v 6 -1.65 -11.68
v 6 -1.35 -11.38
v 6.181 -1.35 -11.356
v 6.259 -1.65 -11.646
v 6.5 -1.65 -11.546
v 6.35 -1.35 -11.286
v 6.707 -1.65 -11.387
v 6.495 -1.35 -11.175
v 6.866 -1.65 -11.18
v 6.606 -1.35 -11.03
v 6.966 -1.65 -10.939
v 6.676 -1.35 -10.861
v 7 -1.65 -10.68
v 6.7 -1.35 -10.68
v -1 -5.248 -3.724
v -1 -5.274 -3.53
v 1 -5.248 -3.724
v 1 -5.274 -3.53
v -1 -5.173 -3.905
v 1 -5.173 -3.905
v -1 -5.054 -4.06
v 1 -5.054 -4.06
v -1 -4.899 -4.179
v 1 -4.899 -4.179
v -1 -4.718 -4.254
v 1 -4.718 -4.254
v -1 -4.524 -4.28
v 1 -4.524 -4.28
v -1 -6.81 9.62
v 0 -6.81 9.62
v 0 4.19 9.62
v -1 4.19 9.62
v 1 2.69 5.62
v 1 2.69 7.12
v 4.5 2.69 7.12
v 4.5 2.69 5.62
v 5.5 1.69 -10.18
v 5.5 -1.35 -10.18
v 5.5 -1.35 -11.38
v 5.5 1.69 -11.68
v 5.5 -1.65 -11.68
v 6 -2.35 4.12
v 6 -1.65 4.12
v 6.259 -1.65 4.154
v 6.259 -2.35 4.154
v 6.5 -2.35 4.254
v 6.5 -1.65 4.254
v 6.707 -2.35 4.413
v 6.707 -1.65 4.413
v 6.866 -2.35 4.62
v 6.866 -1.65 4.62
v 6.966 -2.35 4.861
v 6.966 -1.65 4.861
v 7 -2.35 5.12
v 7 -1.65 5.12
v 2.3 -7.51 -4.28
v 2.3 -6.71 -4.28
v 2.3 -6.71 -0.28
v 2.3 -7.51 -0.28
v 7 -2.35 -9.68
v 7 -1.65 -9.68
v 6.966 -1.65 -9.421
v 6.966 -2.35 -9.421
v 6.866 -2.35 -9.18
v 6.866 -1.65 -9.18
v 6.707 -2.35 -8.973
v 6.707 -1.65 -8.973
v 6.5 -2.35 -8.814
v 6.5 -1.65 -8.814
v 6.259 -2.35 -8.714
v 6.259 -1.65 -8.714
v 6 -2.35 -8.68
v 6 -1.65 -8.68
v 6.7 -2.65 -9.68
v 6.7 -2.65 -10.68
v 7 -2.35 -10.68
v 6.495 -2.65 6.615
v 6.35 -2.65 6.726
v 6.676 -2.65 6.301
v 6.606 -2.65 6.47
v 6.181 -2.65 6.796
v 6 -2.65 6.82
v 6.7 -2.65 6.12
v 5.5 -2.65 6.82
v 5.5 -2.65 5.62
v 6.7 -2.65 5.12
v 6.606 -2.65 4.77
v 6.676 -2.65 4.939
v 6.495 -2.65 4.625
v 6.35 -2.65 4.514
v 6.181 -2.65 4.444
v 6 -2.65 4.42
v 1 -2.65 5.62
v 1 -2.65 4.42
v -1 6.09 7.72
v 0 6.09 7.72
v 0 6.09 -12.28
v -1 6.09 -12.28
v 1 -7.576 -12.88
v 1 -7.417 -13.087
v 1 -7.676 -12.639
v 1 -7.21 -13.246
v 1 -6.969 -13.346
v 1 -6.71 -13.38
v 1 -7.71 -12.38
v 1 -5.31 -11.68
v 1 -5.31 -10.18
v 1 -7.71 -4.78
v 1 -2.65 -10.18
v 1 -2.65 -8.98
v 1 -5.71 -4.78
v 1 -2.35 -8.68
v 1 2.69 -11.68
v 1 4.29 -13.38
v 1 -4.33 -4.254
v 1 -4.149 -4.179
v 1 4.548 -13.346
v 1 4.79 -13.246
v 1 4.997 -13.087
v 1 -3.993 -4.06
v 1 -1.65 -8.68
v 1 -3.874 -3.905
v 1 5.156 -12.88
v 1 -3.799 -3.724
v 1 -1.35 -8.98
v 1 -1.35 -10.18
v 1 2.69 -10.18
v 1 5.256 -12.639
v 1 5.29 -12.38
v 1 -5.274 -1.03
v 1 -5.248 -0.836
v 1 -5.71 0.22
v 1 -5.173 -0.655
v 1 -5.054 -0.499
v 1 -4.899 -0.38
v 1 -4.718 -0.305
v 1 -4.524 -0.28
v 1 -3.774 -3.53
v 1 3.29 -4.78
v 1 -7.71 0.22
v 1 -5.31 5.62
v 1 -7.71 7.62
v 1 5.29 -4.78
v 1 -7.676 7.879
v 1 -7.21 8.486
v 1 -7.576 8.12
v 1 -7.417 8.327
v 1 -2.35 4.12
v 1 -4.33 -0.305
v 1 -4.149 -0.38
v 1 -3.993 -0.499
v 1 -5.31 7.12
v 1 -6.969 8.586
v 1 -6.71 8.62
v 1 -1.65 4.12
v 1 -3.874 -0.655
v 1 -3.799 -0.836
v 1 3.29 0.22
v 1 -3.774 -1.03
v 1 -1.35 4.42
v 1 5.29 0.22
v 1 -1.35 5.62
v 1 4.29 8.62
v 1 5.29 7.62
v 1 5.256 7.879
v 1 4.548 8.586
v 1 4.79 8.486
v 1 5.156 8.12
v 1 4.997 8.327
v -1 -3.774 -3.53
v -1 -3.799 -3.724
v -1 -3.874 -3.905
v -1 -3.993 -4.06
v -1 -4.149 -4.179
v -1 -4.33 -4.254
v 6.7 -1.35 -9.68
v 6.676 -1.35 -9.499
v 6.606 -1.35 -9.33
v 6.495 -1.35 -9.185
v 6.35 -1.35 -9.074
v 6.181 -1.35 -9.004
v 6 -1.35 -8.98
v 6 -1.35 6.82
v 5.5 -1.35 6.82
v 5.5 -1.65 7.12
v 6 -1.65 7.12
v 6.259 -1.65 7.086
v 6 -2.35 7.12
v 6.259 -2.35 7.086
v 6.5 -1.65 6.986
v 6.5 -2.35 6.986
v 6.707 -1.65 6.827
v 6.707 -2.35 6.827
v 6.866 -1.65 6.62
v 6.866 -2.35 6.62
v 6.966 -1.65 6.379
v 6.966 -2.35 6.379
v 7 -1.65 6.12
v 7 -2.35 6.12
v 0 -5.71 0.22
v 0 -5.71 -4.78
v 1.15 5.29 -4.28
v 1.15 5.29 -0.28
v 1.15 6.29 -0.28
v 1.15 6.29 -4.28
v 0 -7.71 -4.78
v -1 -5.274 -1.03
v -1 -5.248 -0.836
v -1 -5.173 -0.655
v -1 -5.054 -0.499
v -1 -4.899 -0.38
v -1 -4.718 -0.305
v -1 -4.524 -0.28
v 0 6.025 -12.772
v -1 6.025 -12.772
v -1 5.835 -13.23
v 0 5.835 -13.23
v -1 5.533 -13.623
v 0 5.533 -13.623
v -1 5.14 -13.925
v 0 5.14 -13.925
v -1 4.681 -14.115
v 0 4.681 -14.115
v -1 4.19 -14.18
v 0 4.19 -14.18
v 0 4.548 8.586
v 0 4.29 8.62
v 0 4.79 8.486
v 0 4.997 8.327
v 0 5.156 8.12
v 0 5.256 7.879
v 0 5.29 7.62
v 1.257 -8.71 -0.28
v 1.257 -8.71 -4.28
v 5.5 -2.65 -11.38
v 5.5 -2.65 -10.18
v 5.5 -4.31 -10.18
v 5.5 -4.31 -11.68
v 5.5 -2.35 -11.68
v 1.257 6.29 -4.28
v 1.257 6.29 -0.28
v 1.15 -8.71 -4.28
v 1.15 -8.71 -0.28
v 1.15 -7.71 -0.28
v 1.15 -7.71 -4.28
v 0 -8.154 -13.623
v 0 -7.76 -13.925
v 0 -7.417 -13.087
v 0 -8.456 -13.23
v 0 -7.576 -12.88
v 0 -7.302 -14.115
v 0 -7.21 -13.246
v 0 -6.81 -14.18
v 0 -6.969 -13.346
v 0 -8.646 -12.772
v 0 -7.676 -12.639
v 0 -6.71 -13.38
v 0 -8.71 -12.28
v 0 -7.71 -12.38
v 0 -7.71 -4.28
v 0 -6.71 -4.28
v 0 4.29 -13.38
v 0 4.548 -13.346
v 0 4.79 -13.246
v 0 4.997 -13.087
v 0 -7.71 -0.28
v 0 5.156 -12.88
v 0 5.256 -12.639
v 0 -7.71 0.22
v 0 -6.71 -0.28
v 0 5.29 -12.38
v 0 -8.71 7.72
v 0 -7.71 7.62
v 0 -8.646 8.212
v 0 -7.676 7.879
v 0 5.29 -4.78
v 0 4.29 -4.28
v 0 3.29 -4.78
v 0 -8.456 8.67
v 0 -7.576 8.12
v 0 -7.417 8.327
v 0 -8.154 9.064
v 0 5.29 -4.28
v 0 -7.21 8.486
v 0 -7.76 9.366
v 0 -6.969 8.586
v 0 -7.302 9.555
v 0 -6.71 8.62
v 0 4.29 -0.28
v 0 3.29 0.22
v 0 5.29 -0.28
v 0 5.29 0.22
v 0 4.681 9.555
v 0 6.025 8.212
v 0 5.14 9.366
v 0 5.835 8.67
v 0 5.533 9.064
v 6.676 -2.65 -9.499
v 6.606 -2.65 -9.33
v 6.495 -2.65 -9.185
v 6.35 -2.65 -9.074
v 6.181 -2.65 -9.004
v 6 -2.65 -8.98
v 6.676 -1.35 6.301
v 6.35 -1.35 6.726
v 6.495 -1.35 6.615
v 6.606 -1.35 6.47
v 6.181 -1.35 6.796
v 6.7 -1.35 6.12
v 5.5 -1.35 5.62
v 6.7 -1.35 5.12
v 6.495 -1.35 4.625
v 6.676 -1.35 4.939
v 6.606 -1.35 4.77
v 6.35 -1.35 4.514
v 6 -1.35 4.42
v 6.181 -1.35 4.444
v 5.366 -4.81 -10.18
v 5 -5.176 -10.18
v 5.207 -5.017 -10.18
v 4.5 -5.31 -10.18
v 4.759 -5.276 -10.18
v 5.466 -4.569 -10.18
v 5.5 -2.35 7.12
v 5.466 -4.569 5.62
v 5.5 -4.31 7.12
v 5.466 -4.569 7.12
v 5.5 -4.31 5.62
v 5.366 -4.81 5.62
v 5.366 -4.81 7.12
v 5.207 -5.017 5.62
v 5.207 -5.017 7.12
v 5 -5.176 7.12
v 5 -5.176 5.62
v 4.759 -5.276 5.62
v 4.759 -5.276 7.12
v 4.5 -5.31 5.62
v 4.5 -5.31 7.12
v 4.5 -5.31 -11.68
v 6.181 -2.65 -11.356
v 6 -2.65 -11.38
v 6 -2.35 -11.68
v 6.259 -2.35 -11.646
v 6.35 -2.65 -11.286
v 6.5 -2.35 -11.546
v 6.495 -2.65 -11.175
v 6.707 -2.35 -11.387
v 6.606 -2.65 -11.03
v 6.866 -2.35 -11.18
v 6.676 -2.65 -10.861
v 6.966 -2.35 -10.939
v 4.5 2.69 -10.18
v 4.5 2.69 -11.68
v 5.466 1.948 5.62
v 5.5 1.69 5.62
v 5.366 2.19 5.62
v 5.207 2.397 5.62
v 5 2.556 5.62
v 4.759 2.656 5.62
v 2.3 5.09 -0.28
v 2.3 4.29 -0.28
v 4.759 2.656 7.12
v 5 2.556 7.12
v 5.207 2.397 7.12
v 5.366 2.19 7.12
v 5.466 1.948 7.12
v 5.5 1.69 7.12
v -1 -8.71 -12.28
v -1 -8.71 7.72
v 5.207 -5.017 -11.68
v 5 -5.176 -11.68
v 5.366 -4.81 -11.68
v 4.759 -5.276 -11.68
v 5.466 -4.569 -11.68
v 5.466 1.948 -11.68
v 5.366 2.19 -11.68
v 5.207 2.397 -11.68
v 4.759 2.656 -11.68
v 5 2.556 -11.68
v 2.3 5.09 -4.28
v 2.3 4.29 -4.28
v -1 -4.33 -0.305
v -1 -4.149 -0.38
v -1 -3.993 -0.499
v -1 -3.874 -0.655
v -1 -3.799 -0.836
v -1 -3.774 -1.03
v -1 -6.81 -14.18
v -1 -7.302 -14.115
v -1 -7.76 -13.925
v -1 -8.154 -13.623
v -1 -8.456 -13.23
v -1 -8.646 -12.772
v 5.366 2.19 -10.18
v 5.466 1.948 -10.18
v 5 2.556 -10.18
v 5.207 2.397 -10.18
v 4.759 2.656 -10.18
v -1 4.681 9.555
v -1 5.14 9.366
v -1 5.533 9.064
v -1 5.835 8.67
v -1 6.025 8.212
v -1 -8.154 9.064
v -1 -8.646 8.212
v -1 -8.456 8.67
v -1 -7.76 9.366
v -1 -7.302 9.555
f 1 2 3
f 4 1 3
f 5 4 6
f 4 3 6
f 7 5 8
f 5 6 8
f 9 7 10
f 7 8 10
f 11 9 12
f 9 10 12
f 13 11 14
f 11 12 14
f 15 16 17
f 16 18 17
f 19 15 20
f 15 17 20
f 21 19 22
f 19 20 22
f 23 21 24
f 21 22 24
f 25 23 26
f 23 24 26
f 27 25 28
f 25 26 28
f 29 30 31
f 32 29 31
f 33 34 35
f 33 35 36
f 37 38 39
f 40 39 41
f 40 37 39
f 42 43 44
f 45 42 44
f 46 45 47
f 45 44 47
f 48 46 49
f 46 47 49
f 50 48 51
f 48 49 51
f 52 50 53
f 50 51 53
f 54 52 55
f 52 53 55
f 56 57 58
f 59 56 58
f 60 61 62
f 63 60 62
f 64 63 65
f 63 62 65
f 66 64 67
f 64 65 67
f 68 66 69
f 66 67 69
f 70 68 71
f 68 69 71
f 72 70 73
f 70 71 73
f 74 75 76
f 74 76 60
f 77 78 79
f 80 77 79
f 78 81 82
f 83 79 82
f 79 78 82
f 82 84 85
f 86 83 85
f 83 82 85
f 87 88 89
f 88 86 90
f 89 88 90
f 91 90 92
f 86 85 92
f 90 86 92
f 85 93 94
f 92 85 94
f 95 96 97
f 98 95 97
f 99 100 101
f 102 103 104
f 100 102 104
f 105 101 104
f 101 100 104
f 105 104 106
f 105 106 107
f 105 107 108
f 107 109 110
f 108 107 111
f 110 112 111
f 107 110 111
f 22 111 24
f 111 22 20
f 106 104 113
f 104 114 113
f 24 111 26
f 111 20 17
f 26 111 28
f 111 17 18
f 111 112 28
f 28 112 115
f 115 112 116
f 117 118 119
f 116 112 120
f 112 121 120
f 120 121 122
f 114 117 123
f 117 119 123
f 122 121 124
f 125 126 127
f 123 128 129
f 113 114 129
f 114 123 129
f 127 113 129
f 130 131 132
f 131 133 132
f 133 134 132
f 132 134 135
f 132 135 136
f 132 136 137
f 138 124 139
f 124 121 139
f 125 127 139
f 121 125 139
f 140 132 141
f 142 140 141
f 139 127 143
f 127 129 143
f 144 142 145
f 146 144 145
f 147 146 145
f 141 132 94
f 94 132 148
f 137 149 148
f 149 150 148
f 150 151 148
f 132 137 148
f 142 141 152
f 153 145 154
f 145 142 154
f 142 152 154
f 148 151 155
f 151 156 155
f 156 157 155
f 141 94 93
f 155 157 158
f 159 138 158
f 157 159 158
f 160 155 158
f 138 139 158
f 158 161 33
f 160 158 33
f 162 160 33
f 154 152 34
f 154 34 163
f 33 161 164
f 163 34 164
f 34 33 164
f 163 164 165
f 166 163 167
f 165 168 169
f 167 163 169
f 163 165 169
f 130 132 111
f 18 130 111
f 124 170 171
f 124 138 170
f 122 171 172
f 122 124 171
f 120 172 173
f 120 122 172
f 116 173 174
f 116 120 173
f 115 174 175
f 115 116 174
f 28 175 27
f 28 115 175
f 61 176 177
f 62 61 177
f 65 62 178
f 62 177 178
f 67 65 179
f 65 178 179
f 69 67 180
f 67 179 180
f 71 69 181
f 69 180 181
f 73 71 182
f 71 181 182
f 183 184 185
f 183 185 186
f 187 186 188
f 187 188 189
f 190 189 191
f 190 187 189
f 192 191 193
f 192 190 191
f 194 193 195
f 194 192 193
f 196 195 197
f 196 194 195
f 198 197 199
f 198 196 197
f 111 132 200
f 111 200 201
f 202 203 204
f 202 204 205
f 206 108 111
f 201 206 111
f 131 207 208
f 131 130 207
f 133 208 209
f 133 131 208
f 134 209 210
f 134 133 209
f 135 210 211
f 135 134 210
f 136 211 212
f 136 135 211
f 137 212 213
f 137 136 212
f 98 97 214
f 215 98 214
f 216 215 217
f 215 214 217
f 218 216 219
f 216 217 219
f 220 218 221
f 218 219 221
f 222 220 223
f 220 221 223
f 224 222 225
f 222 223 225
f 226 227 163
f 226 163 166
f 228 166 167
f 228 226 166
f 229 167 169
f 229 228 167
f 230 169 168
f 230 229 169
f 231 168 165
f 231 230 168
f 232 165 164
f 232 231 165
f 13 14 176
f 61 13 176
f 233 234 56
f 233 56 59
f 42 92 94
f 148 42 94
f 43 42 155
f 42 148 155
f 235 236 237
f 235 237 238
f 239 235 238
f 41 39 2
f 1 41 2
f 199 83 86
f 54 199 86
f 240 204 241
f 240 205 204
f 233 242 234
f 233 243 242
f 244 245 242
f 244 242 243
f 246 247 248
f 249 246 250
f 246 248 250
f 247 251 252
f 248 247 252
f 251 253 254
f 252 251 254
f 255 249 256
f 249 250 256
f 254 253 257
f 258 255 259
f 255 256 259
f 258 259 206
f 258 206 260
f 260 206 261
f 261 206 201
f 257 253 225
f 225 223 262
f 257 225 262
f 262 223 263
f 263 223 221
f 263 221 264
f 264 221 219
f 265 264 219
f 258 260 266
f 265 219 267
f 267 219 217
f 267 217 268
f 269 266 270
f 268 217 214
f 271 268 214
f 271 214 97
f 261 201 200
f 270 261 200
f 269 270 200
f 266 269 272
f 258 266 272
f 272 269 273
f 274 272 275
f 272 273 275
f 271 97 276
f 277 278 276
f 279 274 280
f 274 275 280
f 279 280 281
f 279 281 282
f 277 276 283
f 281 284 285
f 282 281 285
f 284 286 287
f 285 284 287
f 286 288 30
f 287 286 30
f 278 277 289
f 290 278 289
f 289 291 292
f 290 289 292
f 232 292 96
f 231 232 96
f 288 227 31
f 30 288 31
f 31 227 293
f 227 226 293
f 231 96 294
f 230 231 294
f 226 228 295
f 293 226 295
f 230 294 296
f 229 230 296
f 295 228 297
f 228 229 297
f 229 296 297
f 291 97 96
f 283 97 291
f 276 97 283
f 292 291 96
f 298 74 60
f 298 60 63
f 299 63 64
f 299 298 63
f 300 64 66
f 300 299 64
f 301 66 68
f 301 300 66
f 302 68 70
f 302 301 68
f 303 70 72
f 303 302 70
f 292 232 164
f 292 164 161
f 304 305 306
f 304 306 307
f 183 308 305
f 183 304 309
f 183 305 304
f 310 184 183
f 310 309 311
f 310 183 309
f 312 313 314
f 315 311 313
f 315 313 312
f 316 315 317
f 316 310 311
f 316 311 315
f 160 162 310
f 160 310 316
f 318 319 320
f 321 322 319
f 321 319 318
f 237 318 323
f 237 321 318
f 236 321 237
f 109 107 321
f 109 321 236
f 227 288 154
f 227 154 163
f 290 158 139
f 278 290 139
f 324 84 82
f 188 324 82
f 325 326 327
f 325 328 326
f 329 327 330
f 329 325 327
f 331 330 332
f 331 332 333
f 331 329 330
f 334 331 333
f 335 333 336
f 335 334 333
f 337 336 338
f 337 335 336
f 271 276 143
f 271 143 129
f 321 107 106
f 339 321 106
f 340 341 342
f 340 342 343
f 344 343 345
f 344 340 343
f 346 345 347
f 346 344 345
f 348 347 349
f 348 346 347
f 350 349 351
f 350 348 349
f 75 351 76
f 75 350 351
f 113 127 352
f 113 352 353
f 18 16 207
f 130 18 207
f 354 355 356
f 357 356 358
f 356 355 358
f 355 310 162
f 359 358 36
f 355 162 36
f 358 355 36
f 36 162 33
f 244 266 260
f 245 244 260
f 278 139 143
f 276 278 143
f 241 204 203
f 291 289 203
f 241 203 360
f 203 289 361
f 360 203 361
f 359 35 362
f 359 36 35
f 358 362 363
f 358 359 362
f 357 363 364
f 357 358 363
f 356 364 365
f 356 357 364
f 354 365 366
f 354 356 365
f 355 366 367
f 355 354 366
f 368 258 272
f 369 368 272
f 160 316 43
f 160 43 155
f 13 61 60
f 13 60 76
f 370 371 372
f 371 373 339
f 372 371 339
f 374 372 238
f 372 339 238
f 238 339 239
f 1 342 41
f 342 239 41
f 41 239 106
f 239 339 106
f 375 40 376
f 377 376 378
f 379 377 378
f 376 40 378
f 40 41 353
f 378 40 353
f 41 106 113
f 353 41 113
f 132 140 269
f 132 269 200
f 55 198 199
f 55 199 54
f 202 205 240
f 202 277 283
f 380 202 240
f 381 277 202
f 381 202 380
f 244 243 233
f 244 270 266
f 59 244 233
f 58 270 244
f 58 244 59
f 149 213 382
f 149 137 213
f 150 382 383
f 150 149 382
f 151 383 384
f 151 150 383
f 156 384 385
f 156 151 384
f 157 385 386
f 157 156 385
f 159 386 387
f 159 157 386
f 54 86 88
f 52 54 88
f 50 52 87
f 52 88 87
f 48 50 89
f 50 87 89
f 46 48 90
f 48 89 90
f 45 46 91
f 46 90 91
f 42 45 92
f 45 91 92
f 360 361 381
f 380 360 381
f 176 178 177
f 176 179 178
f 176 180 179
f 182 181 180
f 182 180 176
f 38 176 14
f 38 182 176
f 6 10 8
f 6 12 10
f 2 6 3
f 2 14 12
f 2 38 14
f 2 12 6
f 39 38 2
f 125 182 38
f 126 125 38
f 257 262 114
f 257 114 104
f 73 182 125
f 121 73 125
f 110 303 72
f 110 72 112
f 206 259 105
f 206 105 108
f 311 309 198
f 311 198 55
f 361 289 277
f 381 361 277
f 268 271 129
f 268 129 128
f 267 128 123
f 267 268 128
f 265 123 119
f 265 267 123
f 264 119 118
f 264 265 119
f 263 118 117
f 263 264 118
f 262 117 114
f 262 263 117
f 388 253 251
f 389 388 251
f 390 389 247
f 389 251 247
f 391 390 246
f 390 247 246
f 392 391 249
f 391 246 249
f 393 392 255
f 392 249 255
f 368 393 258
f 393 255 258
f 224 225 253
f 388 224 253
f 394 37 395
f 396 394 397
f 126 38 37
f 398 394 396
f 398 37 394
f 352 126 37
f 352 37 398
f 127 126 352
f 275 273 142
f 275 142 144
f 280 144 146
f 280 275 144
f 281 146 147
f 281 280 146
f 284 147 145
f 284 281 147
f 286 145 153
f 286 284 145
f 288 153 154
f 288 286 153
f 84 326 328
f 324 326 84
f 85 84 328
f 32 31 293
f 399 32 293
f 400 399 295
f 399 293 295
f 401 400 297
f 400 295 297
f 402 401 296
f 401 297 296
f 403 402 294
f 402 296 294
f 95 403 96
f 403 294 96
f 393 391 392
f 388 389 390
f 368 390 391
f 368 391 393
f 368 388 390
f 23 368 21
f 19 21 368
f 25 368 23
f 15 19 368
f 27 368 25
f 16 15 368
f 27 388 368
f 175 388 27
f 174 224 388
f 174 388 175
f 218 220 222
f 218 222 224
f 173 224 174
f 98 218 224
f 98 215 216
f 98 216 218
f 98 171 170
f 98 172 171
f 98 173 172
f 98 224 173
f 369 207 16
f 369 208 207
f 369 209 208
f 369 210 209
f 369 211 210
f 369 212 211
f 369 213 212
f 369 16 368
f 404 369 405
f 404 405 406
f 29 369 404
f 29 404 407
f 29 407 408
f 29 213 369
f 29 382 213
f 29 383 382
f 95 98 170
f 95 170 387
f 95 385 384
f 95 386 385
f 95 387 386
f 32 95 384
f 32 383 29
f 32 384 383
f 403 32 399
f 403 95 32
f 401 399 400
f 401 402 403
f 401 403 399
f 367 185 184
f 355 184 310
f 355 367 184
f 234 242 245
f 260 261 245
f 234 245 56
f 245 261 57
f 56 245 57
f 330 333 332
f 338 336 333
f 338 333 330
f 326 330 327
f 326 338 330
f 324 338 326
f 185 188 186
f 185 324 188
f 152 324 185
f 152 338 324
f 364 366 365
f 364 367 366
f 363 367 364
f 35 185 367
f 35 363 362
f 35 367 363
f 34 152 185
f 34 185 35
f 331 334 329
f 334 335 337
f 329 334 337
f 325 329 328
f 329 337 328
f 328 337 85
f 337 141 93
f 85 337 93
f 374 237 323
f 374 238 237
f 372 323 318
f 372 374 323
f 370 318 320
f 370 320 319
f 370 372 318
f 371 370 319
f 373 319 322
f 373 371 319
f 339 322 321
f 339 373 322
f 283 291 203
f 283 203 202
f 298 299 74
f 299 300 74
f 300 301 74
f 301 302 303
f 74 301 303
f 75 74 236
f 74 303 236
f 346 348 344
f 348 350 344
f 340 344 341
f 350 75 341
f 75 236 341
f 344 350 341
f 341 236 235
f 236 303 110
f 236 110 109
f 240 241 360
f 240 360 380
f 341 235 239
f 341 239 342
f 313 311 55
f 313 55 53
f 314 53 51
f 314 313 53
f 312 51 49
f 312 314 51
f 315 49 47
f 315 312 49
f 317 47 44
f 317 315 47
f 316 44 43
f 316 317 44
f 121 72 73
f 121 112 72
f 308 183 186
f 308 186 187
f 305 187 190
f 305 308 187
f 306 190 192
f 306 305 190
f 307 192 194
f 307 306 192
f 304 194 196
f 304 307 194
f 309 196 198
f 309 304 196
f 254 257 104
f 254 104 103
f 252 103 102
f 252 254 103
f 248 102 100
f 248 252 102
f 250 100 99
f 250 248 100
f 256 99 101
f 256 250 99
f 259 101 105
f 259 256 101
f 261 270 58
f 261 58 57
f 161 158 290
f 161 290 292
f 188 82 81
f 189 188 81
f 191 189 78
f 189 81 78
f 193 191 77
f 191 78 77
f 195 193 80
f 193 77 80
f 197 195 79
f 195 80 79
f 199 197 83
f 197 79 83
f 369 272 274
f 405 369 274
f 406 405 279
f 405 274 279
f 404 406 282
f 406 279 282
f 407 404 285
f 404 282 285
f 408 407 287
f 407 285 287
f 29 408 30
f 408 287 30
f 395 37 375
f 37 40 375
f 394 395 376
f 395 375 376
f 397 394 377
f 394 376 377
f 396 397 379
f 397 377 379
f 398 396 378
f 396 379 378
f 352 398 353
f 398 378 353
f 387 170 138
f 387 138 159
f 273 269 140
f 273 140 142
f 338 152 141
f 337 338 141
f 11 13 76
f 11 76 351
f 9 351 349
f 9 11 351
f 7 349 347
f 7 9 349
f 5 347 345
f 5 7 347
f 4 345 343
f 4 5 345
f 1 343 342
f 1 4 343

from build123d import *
from OCP.BRepFilletAPI import BRepFilletAPI_MakeChamfer

# Parameters (mm, degrees)
EXTRUDE_1_DEPTH     = 1
EXTRUDE_2_DEPTH     = 1
SKETCH_3_W          = 1.5
SKETCH_3_H          = 8
EXTRUDE_3_DEPTH     = 4.5
SKETCH_4_W          = 3
SKETCH_4_H          = 1.3
EXTRUDE_4_DEPTH     = 6
FILLET_1_R          = 1
CHAMFER_1_SIZE      = 0.3
SKETCH_5_W          = 5
SKETCH_5_H          = 2
CUT_EXTRUDE_1_DEPTH = 1
SKETCH_6_W          = 4
SKETCH_6_H          = 1
EXTRUDE_5_DEPTH     = 2.3
SKETCH_7_W          = 1.15
SKETCH_7_H          = 4
EXTRUDE_6_DEPTH     = 1
CUT_EXTRUDE_2_REACH = 20.465
SKETCH_10_W         = 4
SKETCH_10_H         = 1.5
FILLET_2_R          = 0.75
SKETCH_11_W         = 1.15
SKETCH_11_H         = 4
EXTRUDE_7_DEPTH     = 1
CHAMFER_2_SIZE      = 1.2
CHAMFER_2_SIZE2     = 1.043144085


with BuildPart() as part:
    # 草图1 → 凸台-拉伸1 (new body)
    with BuildSketch(Plane(origin=(0, 0, 0), x_dir=(0, 0, -1), z_dir=(1, 0, 0))):
        with BuildLine():
            Line((-8.62016793, -6.710374314), (-8.62016793, 4.289625686))
            ThreePointArc((-8.62016793, 4.289625686), (-8.327274711, 4.996732467), (-7.62016793, 5.289625686))
            Line((-7.62016793, 5.289625686), (12.37983207, 5.289625686))
            ThreePointArc((12.37983207, 5.289625686), (13.086938851, 4.996732467), (13.37983207, 4.289625686))
            Line((13.37983207, 4.289625686), (13.37983207, -6.710374314))
            ThreePointArc((13.37983207, -6.710374314), (13.086938851, -7.417481096), (12.37983207, -7.710374314))
            Line((12.37983207, -7.710374314), (-7.62016793, -7.710374314))
            ThreePointArc((-7.62016793, -7.710374314), (-8.327274711, -7.417481096), (-8.62016793, -6.710374314))
        make_face()
    extrude(amount=EXTRUDE_1_DEPTH)

    # 草图2 → 凸台-拉伸2 (add)
    with BuildSketch(Plane.ZY):
        with BuildLine():
            Line((9.62016793, -6.810374314), (9.62016793, 4.189625686))
            ThreePointArc((9.62016793, 4.189625686), (9.063670815, 5.53312857), (7.72016793, 6.089625686))
            Line((7.72016793, 6.089625686), (-12.27983207, 6.089625686))
            ThreePointArc((-12.27983207, 6.089625686), (-13.623334954, 5.53312857), (-14.17983207, 4.189625686))
            Line((-14.17983207, 4.189625686), (-14.17983207, -6.810374314))
            ThreePointArc((-14.17983207, -6.810374314), (-13.623334954, -8.153877199), (-12.27983207, -8.710374314))
            Line((-12.27983207, -8.710374314), (7.72016793, -8.710374314))
            ThreePointArc((7.72016793, -8.710374314), (9.063670815, -8.153877199), (9.62016793, -6.810374314))
        make_face()
    extrude(amount=EXTRUDE_2_DEPTH)

    # 草图3 → 凸台-拉伸3 (add)
    with BuildSketch(Plane(origin=(1, 0, 0), x_dir=(0, 0, -1), z_dir=(1, 0, 0))):
        with Locations((-6.37016793, -1.310374314)):
            Rectangle(SKETCH_3_W, SKETCH_3_H)
        with Locations((10.92983207, -1.310374314)):
            Rectangle(SKETCH_3_W, SKETCH_3_H)
    extrude(amount=EXTRUDE_3_DEPTH)

    # 草图4 → 凸台-拉伸4 (add)
    with BuildSketch(Plane(origin=(1, 0, 0), x_dir=(0, 0, -1), z_dir=(1, 0, 0))):
        with Locations((-5.62016793, -1.999635097)):
            Rectangle(SKETCH_4_W, SKETCH_4_H)
        with Locations((10.17983207, -1.999635097)):
            Rectangle(SKETCH_4_W, SKETCH_4_H)
    extrude(amount=EXTRUDE_4_DEPTH)

    # 圆角1
    fillet_1_edges = [part.edges().sort_by_distance(p)[0] for p in [
        (7, -1.999635097, -8.67983207),
        (7, -1.999635097, -11.67983207),
        (5.5, -5.310374314, 6.37016793),
        (5.5, 2.689625686, 6.37016793),
        (5.5, -5.310374314, -10.92983207),
        (5.5, 2.689625686, -10.92983207),
        (7, -1.999635097, 7.12016793),
        (7, -1.999635097, 4.12016793),
    ]]
    fillet(fillet_1_edges, radius=FILLET_1_R)

    # 倒角1
    chamfer_1_edges = [part.edges().sort_by_distance(p)[0] for p in [
        (5.75, -2.649635097, 7.12016793),
        (5.75, -1.349635097, 7.12016793),
        (5.75, -1.349635097, -11.67983207),
        (5.75, -2.649635097, -11.67983207),
        (7, -2.649635097, -10.17983207),
        (7, -1.349635097, -10.17983207),
        (3.5, -2.649635097, -8.67983207),
        (6.707106781, -2.649635097, -11.386938851),
        (6.707106781, -2.649635097, -8.972725289),
        (3.5, -1.349635097, -8.67983207),
        (6.707106781, -1.349635097, -11.386938851),
        (6.707106781, -1.349635097, -8.972725289),
        (7, -2.649635097, 5.62016793),
        (7, -1.349635097, 5.62016793),
        (3.5, -2.649635097, 4.12016793),
        (6.707106781, -2.649635097, 4.413061149),
        (6.707106781, -2.649635097, 6.827274711),
        (3.5, -1.349635097, 4.12016793),
        (6.707106781, -1.349635097, 4.413061149),
        (6.707106781, -1.349635097, 6.827274711),
    ]]
    chamfer(chamfer_1_edges, length=CHAMFER_1_SIZE)

    # 草图5 → 切除-拉伸1 (cut)
    with BuildSketch(Plane(origin=(1, 0, 0), x_dir=(0, 0, -1), z_dir=(1, 0, 0))):
        with Locations((2.27983207, -6.710374314)):
            Rectangle(SKETCH_5_W, SKETCH_5_H)
        with Locations((2.27983207, 4.289625686)):
            Rectangle(SKETCH_5_W, SKETCH_5_H)
    extrude(amount=-CUT_EXTRUDE_1_DEPTH, mode=Mode.SUBTRACT)

    # 草图6 → 凸台-拉伸5 (add)
    with BuildSketch(Plane(origin=(0, 0, 0), x_dir=(0, 0, -1), z_dir=(1, 0, 0))):
        with Locations((2.27983207, -7.210374314)):
            Rectangle(SKETCH_6_W, SKETCH_6_H)
        with Locations((2.27983207, 4.789625686)):
            Rectangle(SKETCH_6_W, SKETCH_6_H)
    extrude(amount=EXTRUDE_5_DEPTH)

    # 草图7 → 凸台-拉伸6 (add)
    with BuildSketch(Plane.XZ.offset(7.710374314)):
        with Locations((1.725, -2.27983207)):
            Rectangle(SKETCH_7_W, SKETCH_7_H)
    extrude(amount=EXTRUDE_6_DEPTH)

    # 草图10 → 切除-拉伸2 (cut, up to next)
    with BuildSketch(Plane.ZY.offset(1), mode=Mode.PRIVATE) as cut_extrude_2_sk1:
        with Locations((-2.27983207, -4.523813103)):
            Rectangle(SKETCH_10_W, SKETCH_10_H)
    cut_extrude_2_tool1 = extrude(cut_extrude_2_sk1.sketch, amount=-CUT_EXTRUDE_2_REACH, mode=Mode.PRIVATE) & part.part
    add(cut_extrude_2_tool1.solids().sort_by_distance((-1, -4.523813, -2.279832))[0], mode=Mode.SUBTRACT)

    # 圆角2
    fillet_2_edges = [part.edges().sort_by_distance(p)[0] for p in [
        (0, -5.273813103, -0.27983207),
        (0, -3.773813103, -0.27983207),
        (0, -3.773813103, -4.27983207),
        (0, -5.273813103, -4.27983207),
    ]]
    fillet(fillet_2_edges, radius=FILLET_2_R - 0.0001)  # a hair under: the kernel refuses the full size

    # 草图11 → 凸台-拉伸7 (add)
    with BuildSketch(Plane(origin=(0, 5.289625686, 0), x_dir=(1, 0, 0), z_dir=(0, 1, 0))):
        with Locations((1.725, 2.27983207)):
            Rectangle(SKETCH_11_W, SKETCH_11_H)
    extrude(amount=EXTRUDE_7_DEPTH)

    # 倒角2: one chamfer whose edges measure the first distance from different faces: ONE call of the kernel's chamfer builder (chamfer() names one face for all edges)
    chamfer_2_edges_1 = [part.edges().sort_by_distance(p)[0] for p in [
        (2.3, -8.710374314, -2.27983207),
    ]]
    chamfer_2_side_1 = [part.faces().sort_by_distance(p)[0] for p in [
        (2.3, -7.710374314, -2.27983207),
    ]]
    chamfer_2_edges_2 = [part.edges().sort_by_distance(p)[0] for p in [
        (2.3, 6.289625686, -2.27983207),
    ]]
    chamfer_2_side_2 = [part.faces().sort_by_distance(p)[0] for p in [
        (2.3, 5.289625686, -2.27983207),
    ]]
    chamfer_2 = BRepFilletAPI_MakeChamfer(part.part.solid().wrapped)
    for e in chamfer_2_edges_1:
        chamfer_2.Add(CHAMFER_2_SIZE, CHAMFER_2_SIZE2, e.wrapped, chamfer_2_side_1[0].wrapped)  # the first distance lies on this face
    for e in chamfer_2_edges_2:
        chamfer_2.Add(CHAMFER_2_SIZE, CHAMFER_2_SIZE2, e.wrapped, chamfer_2_side_2[0].wrapped)  # the first distance lies on this face
    add(Compound.cast(chamfer_2.Shape()), mode=Mode.REPLACE)


solid = part.part
